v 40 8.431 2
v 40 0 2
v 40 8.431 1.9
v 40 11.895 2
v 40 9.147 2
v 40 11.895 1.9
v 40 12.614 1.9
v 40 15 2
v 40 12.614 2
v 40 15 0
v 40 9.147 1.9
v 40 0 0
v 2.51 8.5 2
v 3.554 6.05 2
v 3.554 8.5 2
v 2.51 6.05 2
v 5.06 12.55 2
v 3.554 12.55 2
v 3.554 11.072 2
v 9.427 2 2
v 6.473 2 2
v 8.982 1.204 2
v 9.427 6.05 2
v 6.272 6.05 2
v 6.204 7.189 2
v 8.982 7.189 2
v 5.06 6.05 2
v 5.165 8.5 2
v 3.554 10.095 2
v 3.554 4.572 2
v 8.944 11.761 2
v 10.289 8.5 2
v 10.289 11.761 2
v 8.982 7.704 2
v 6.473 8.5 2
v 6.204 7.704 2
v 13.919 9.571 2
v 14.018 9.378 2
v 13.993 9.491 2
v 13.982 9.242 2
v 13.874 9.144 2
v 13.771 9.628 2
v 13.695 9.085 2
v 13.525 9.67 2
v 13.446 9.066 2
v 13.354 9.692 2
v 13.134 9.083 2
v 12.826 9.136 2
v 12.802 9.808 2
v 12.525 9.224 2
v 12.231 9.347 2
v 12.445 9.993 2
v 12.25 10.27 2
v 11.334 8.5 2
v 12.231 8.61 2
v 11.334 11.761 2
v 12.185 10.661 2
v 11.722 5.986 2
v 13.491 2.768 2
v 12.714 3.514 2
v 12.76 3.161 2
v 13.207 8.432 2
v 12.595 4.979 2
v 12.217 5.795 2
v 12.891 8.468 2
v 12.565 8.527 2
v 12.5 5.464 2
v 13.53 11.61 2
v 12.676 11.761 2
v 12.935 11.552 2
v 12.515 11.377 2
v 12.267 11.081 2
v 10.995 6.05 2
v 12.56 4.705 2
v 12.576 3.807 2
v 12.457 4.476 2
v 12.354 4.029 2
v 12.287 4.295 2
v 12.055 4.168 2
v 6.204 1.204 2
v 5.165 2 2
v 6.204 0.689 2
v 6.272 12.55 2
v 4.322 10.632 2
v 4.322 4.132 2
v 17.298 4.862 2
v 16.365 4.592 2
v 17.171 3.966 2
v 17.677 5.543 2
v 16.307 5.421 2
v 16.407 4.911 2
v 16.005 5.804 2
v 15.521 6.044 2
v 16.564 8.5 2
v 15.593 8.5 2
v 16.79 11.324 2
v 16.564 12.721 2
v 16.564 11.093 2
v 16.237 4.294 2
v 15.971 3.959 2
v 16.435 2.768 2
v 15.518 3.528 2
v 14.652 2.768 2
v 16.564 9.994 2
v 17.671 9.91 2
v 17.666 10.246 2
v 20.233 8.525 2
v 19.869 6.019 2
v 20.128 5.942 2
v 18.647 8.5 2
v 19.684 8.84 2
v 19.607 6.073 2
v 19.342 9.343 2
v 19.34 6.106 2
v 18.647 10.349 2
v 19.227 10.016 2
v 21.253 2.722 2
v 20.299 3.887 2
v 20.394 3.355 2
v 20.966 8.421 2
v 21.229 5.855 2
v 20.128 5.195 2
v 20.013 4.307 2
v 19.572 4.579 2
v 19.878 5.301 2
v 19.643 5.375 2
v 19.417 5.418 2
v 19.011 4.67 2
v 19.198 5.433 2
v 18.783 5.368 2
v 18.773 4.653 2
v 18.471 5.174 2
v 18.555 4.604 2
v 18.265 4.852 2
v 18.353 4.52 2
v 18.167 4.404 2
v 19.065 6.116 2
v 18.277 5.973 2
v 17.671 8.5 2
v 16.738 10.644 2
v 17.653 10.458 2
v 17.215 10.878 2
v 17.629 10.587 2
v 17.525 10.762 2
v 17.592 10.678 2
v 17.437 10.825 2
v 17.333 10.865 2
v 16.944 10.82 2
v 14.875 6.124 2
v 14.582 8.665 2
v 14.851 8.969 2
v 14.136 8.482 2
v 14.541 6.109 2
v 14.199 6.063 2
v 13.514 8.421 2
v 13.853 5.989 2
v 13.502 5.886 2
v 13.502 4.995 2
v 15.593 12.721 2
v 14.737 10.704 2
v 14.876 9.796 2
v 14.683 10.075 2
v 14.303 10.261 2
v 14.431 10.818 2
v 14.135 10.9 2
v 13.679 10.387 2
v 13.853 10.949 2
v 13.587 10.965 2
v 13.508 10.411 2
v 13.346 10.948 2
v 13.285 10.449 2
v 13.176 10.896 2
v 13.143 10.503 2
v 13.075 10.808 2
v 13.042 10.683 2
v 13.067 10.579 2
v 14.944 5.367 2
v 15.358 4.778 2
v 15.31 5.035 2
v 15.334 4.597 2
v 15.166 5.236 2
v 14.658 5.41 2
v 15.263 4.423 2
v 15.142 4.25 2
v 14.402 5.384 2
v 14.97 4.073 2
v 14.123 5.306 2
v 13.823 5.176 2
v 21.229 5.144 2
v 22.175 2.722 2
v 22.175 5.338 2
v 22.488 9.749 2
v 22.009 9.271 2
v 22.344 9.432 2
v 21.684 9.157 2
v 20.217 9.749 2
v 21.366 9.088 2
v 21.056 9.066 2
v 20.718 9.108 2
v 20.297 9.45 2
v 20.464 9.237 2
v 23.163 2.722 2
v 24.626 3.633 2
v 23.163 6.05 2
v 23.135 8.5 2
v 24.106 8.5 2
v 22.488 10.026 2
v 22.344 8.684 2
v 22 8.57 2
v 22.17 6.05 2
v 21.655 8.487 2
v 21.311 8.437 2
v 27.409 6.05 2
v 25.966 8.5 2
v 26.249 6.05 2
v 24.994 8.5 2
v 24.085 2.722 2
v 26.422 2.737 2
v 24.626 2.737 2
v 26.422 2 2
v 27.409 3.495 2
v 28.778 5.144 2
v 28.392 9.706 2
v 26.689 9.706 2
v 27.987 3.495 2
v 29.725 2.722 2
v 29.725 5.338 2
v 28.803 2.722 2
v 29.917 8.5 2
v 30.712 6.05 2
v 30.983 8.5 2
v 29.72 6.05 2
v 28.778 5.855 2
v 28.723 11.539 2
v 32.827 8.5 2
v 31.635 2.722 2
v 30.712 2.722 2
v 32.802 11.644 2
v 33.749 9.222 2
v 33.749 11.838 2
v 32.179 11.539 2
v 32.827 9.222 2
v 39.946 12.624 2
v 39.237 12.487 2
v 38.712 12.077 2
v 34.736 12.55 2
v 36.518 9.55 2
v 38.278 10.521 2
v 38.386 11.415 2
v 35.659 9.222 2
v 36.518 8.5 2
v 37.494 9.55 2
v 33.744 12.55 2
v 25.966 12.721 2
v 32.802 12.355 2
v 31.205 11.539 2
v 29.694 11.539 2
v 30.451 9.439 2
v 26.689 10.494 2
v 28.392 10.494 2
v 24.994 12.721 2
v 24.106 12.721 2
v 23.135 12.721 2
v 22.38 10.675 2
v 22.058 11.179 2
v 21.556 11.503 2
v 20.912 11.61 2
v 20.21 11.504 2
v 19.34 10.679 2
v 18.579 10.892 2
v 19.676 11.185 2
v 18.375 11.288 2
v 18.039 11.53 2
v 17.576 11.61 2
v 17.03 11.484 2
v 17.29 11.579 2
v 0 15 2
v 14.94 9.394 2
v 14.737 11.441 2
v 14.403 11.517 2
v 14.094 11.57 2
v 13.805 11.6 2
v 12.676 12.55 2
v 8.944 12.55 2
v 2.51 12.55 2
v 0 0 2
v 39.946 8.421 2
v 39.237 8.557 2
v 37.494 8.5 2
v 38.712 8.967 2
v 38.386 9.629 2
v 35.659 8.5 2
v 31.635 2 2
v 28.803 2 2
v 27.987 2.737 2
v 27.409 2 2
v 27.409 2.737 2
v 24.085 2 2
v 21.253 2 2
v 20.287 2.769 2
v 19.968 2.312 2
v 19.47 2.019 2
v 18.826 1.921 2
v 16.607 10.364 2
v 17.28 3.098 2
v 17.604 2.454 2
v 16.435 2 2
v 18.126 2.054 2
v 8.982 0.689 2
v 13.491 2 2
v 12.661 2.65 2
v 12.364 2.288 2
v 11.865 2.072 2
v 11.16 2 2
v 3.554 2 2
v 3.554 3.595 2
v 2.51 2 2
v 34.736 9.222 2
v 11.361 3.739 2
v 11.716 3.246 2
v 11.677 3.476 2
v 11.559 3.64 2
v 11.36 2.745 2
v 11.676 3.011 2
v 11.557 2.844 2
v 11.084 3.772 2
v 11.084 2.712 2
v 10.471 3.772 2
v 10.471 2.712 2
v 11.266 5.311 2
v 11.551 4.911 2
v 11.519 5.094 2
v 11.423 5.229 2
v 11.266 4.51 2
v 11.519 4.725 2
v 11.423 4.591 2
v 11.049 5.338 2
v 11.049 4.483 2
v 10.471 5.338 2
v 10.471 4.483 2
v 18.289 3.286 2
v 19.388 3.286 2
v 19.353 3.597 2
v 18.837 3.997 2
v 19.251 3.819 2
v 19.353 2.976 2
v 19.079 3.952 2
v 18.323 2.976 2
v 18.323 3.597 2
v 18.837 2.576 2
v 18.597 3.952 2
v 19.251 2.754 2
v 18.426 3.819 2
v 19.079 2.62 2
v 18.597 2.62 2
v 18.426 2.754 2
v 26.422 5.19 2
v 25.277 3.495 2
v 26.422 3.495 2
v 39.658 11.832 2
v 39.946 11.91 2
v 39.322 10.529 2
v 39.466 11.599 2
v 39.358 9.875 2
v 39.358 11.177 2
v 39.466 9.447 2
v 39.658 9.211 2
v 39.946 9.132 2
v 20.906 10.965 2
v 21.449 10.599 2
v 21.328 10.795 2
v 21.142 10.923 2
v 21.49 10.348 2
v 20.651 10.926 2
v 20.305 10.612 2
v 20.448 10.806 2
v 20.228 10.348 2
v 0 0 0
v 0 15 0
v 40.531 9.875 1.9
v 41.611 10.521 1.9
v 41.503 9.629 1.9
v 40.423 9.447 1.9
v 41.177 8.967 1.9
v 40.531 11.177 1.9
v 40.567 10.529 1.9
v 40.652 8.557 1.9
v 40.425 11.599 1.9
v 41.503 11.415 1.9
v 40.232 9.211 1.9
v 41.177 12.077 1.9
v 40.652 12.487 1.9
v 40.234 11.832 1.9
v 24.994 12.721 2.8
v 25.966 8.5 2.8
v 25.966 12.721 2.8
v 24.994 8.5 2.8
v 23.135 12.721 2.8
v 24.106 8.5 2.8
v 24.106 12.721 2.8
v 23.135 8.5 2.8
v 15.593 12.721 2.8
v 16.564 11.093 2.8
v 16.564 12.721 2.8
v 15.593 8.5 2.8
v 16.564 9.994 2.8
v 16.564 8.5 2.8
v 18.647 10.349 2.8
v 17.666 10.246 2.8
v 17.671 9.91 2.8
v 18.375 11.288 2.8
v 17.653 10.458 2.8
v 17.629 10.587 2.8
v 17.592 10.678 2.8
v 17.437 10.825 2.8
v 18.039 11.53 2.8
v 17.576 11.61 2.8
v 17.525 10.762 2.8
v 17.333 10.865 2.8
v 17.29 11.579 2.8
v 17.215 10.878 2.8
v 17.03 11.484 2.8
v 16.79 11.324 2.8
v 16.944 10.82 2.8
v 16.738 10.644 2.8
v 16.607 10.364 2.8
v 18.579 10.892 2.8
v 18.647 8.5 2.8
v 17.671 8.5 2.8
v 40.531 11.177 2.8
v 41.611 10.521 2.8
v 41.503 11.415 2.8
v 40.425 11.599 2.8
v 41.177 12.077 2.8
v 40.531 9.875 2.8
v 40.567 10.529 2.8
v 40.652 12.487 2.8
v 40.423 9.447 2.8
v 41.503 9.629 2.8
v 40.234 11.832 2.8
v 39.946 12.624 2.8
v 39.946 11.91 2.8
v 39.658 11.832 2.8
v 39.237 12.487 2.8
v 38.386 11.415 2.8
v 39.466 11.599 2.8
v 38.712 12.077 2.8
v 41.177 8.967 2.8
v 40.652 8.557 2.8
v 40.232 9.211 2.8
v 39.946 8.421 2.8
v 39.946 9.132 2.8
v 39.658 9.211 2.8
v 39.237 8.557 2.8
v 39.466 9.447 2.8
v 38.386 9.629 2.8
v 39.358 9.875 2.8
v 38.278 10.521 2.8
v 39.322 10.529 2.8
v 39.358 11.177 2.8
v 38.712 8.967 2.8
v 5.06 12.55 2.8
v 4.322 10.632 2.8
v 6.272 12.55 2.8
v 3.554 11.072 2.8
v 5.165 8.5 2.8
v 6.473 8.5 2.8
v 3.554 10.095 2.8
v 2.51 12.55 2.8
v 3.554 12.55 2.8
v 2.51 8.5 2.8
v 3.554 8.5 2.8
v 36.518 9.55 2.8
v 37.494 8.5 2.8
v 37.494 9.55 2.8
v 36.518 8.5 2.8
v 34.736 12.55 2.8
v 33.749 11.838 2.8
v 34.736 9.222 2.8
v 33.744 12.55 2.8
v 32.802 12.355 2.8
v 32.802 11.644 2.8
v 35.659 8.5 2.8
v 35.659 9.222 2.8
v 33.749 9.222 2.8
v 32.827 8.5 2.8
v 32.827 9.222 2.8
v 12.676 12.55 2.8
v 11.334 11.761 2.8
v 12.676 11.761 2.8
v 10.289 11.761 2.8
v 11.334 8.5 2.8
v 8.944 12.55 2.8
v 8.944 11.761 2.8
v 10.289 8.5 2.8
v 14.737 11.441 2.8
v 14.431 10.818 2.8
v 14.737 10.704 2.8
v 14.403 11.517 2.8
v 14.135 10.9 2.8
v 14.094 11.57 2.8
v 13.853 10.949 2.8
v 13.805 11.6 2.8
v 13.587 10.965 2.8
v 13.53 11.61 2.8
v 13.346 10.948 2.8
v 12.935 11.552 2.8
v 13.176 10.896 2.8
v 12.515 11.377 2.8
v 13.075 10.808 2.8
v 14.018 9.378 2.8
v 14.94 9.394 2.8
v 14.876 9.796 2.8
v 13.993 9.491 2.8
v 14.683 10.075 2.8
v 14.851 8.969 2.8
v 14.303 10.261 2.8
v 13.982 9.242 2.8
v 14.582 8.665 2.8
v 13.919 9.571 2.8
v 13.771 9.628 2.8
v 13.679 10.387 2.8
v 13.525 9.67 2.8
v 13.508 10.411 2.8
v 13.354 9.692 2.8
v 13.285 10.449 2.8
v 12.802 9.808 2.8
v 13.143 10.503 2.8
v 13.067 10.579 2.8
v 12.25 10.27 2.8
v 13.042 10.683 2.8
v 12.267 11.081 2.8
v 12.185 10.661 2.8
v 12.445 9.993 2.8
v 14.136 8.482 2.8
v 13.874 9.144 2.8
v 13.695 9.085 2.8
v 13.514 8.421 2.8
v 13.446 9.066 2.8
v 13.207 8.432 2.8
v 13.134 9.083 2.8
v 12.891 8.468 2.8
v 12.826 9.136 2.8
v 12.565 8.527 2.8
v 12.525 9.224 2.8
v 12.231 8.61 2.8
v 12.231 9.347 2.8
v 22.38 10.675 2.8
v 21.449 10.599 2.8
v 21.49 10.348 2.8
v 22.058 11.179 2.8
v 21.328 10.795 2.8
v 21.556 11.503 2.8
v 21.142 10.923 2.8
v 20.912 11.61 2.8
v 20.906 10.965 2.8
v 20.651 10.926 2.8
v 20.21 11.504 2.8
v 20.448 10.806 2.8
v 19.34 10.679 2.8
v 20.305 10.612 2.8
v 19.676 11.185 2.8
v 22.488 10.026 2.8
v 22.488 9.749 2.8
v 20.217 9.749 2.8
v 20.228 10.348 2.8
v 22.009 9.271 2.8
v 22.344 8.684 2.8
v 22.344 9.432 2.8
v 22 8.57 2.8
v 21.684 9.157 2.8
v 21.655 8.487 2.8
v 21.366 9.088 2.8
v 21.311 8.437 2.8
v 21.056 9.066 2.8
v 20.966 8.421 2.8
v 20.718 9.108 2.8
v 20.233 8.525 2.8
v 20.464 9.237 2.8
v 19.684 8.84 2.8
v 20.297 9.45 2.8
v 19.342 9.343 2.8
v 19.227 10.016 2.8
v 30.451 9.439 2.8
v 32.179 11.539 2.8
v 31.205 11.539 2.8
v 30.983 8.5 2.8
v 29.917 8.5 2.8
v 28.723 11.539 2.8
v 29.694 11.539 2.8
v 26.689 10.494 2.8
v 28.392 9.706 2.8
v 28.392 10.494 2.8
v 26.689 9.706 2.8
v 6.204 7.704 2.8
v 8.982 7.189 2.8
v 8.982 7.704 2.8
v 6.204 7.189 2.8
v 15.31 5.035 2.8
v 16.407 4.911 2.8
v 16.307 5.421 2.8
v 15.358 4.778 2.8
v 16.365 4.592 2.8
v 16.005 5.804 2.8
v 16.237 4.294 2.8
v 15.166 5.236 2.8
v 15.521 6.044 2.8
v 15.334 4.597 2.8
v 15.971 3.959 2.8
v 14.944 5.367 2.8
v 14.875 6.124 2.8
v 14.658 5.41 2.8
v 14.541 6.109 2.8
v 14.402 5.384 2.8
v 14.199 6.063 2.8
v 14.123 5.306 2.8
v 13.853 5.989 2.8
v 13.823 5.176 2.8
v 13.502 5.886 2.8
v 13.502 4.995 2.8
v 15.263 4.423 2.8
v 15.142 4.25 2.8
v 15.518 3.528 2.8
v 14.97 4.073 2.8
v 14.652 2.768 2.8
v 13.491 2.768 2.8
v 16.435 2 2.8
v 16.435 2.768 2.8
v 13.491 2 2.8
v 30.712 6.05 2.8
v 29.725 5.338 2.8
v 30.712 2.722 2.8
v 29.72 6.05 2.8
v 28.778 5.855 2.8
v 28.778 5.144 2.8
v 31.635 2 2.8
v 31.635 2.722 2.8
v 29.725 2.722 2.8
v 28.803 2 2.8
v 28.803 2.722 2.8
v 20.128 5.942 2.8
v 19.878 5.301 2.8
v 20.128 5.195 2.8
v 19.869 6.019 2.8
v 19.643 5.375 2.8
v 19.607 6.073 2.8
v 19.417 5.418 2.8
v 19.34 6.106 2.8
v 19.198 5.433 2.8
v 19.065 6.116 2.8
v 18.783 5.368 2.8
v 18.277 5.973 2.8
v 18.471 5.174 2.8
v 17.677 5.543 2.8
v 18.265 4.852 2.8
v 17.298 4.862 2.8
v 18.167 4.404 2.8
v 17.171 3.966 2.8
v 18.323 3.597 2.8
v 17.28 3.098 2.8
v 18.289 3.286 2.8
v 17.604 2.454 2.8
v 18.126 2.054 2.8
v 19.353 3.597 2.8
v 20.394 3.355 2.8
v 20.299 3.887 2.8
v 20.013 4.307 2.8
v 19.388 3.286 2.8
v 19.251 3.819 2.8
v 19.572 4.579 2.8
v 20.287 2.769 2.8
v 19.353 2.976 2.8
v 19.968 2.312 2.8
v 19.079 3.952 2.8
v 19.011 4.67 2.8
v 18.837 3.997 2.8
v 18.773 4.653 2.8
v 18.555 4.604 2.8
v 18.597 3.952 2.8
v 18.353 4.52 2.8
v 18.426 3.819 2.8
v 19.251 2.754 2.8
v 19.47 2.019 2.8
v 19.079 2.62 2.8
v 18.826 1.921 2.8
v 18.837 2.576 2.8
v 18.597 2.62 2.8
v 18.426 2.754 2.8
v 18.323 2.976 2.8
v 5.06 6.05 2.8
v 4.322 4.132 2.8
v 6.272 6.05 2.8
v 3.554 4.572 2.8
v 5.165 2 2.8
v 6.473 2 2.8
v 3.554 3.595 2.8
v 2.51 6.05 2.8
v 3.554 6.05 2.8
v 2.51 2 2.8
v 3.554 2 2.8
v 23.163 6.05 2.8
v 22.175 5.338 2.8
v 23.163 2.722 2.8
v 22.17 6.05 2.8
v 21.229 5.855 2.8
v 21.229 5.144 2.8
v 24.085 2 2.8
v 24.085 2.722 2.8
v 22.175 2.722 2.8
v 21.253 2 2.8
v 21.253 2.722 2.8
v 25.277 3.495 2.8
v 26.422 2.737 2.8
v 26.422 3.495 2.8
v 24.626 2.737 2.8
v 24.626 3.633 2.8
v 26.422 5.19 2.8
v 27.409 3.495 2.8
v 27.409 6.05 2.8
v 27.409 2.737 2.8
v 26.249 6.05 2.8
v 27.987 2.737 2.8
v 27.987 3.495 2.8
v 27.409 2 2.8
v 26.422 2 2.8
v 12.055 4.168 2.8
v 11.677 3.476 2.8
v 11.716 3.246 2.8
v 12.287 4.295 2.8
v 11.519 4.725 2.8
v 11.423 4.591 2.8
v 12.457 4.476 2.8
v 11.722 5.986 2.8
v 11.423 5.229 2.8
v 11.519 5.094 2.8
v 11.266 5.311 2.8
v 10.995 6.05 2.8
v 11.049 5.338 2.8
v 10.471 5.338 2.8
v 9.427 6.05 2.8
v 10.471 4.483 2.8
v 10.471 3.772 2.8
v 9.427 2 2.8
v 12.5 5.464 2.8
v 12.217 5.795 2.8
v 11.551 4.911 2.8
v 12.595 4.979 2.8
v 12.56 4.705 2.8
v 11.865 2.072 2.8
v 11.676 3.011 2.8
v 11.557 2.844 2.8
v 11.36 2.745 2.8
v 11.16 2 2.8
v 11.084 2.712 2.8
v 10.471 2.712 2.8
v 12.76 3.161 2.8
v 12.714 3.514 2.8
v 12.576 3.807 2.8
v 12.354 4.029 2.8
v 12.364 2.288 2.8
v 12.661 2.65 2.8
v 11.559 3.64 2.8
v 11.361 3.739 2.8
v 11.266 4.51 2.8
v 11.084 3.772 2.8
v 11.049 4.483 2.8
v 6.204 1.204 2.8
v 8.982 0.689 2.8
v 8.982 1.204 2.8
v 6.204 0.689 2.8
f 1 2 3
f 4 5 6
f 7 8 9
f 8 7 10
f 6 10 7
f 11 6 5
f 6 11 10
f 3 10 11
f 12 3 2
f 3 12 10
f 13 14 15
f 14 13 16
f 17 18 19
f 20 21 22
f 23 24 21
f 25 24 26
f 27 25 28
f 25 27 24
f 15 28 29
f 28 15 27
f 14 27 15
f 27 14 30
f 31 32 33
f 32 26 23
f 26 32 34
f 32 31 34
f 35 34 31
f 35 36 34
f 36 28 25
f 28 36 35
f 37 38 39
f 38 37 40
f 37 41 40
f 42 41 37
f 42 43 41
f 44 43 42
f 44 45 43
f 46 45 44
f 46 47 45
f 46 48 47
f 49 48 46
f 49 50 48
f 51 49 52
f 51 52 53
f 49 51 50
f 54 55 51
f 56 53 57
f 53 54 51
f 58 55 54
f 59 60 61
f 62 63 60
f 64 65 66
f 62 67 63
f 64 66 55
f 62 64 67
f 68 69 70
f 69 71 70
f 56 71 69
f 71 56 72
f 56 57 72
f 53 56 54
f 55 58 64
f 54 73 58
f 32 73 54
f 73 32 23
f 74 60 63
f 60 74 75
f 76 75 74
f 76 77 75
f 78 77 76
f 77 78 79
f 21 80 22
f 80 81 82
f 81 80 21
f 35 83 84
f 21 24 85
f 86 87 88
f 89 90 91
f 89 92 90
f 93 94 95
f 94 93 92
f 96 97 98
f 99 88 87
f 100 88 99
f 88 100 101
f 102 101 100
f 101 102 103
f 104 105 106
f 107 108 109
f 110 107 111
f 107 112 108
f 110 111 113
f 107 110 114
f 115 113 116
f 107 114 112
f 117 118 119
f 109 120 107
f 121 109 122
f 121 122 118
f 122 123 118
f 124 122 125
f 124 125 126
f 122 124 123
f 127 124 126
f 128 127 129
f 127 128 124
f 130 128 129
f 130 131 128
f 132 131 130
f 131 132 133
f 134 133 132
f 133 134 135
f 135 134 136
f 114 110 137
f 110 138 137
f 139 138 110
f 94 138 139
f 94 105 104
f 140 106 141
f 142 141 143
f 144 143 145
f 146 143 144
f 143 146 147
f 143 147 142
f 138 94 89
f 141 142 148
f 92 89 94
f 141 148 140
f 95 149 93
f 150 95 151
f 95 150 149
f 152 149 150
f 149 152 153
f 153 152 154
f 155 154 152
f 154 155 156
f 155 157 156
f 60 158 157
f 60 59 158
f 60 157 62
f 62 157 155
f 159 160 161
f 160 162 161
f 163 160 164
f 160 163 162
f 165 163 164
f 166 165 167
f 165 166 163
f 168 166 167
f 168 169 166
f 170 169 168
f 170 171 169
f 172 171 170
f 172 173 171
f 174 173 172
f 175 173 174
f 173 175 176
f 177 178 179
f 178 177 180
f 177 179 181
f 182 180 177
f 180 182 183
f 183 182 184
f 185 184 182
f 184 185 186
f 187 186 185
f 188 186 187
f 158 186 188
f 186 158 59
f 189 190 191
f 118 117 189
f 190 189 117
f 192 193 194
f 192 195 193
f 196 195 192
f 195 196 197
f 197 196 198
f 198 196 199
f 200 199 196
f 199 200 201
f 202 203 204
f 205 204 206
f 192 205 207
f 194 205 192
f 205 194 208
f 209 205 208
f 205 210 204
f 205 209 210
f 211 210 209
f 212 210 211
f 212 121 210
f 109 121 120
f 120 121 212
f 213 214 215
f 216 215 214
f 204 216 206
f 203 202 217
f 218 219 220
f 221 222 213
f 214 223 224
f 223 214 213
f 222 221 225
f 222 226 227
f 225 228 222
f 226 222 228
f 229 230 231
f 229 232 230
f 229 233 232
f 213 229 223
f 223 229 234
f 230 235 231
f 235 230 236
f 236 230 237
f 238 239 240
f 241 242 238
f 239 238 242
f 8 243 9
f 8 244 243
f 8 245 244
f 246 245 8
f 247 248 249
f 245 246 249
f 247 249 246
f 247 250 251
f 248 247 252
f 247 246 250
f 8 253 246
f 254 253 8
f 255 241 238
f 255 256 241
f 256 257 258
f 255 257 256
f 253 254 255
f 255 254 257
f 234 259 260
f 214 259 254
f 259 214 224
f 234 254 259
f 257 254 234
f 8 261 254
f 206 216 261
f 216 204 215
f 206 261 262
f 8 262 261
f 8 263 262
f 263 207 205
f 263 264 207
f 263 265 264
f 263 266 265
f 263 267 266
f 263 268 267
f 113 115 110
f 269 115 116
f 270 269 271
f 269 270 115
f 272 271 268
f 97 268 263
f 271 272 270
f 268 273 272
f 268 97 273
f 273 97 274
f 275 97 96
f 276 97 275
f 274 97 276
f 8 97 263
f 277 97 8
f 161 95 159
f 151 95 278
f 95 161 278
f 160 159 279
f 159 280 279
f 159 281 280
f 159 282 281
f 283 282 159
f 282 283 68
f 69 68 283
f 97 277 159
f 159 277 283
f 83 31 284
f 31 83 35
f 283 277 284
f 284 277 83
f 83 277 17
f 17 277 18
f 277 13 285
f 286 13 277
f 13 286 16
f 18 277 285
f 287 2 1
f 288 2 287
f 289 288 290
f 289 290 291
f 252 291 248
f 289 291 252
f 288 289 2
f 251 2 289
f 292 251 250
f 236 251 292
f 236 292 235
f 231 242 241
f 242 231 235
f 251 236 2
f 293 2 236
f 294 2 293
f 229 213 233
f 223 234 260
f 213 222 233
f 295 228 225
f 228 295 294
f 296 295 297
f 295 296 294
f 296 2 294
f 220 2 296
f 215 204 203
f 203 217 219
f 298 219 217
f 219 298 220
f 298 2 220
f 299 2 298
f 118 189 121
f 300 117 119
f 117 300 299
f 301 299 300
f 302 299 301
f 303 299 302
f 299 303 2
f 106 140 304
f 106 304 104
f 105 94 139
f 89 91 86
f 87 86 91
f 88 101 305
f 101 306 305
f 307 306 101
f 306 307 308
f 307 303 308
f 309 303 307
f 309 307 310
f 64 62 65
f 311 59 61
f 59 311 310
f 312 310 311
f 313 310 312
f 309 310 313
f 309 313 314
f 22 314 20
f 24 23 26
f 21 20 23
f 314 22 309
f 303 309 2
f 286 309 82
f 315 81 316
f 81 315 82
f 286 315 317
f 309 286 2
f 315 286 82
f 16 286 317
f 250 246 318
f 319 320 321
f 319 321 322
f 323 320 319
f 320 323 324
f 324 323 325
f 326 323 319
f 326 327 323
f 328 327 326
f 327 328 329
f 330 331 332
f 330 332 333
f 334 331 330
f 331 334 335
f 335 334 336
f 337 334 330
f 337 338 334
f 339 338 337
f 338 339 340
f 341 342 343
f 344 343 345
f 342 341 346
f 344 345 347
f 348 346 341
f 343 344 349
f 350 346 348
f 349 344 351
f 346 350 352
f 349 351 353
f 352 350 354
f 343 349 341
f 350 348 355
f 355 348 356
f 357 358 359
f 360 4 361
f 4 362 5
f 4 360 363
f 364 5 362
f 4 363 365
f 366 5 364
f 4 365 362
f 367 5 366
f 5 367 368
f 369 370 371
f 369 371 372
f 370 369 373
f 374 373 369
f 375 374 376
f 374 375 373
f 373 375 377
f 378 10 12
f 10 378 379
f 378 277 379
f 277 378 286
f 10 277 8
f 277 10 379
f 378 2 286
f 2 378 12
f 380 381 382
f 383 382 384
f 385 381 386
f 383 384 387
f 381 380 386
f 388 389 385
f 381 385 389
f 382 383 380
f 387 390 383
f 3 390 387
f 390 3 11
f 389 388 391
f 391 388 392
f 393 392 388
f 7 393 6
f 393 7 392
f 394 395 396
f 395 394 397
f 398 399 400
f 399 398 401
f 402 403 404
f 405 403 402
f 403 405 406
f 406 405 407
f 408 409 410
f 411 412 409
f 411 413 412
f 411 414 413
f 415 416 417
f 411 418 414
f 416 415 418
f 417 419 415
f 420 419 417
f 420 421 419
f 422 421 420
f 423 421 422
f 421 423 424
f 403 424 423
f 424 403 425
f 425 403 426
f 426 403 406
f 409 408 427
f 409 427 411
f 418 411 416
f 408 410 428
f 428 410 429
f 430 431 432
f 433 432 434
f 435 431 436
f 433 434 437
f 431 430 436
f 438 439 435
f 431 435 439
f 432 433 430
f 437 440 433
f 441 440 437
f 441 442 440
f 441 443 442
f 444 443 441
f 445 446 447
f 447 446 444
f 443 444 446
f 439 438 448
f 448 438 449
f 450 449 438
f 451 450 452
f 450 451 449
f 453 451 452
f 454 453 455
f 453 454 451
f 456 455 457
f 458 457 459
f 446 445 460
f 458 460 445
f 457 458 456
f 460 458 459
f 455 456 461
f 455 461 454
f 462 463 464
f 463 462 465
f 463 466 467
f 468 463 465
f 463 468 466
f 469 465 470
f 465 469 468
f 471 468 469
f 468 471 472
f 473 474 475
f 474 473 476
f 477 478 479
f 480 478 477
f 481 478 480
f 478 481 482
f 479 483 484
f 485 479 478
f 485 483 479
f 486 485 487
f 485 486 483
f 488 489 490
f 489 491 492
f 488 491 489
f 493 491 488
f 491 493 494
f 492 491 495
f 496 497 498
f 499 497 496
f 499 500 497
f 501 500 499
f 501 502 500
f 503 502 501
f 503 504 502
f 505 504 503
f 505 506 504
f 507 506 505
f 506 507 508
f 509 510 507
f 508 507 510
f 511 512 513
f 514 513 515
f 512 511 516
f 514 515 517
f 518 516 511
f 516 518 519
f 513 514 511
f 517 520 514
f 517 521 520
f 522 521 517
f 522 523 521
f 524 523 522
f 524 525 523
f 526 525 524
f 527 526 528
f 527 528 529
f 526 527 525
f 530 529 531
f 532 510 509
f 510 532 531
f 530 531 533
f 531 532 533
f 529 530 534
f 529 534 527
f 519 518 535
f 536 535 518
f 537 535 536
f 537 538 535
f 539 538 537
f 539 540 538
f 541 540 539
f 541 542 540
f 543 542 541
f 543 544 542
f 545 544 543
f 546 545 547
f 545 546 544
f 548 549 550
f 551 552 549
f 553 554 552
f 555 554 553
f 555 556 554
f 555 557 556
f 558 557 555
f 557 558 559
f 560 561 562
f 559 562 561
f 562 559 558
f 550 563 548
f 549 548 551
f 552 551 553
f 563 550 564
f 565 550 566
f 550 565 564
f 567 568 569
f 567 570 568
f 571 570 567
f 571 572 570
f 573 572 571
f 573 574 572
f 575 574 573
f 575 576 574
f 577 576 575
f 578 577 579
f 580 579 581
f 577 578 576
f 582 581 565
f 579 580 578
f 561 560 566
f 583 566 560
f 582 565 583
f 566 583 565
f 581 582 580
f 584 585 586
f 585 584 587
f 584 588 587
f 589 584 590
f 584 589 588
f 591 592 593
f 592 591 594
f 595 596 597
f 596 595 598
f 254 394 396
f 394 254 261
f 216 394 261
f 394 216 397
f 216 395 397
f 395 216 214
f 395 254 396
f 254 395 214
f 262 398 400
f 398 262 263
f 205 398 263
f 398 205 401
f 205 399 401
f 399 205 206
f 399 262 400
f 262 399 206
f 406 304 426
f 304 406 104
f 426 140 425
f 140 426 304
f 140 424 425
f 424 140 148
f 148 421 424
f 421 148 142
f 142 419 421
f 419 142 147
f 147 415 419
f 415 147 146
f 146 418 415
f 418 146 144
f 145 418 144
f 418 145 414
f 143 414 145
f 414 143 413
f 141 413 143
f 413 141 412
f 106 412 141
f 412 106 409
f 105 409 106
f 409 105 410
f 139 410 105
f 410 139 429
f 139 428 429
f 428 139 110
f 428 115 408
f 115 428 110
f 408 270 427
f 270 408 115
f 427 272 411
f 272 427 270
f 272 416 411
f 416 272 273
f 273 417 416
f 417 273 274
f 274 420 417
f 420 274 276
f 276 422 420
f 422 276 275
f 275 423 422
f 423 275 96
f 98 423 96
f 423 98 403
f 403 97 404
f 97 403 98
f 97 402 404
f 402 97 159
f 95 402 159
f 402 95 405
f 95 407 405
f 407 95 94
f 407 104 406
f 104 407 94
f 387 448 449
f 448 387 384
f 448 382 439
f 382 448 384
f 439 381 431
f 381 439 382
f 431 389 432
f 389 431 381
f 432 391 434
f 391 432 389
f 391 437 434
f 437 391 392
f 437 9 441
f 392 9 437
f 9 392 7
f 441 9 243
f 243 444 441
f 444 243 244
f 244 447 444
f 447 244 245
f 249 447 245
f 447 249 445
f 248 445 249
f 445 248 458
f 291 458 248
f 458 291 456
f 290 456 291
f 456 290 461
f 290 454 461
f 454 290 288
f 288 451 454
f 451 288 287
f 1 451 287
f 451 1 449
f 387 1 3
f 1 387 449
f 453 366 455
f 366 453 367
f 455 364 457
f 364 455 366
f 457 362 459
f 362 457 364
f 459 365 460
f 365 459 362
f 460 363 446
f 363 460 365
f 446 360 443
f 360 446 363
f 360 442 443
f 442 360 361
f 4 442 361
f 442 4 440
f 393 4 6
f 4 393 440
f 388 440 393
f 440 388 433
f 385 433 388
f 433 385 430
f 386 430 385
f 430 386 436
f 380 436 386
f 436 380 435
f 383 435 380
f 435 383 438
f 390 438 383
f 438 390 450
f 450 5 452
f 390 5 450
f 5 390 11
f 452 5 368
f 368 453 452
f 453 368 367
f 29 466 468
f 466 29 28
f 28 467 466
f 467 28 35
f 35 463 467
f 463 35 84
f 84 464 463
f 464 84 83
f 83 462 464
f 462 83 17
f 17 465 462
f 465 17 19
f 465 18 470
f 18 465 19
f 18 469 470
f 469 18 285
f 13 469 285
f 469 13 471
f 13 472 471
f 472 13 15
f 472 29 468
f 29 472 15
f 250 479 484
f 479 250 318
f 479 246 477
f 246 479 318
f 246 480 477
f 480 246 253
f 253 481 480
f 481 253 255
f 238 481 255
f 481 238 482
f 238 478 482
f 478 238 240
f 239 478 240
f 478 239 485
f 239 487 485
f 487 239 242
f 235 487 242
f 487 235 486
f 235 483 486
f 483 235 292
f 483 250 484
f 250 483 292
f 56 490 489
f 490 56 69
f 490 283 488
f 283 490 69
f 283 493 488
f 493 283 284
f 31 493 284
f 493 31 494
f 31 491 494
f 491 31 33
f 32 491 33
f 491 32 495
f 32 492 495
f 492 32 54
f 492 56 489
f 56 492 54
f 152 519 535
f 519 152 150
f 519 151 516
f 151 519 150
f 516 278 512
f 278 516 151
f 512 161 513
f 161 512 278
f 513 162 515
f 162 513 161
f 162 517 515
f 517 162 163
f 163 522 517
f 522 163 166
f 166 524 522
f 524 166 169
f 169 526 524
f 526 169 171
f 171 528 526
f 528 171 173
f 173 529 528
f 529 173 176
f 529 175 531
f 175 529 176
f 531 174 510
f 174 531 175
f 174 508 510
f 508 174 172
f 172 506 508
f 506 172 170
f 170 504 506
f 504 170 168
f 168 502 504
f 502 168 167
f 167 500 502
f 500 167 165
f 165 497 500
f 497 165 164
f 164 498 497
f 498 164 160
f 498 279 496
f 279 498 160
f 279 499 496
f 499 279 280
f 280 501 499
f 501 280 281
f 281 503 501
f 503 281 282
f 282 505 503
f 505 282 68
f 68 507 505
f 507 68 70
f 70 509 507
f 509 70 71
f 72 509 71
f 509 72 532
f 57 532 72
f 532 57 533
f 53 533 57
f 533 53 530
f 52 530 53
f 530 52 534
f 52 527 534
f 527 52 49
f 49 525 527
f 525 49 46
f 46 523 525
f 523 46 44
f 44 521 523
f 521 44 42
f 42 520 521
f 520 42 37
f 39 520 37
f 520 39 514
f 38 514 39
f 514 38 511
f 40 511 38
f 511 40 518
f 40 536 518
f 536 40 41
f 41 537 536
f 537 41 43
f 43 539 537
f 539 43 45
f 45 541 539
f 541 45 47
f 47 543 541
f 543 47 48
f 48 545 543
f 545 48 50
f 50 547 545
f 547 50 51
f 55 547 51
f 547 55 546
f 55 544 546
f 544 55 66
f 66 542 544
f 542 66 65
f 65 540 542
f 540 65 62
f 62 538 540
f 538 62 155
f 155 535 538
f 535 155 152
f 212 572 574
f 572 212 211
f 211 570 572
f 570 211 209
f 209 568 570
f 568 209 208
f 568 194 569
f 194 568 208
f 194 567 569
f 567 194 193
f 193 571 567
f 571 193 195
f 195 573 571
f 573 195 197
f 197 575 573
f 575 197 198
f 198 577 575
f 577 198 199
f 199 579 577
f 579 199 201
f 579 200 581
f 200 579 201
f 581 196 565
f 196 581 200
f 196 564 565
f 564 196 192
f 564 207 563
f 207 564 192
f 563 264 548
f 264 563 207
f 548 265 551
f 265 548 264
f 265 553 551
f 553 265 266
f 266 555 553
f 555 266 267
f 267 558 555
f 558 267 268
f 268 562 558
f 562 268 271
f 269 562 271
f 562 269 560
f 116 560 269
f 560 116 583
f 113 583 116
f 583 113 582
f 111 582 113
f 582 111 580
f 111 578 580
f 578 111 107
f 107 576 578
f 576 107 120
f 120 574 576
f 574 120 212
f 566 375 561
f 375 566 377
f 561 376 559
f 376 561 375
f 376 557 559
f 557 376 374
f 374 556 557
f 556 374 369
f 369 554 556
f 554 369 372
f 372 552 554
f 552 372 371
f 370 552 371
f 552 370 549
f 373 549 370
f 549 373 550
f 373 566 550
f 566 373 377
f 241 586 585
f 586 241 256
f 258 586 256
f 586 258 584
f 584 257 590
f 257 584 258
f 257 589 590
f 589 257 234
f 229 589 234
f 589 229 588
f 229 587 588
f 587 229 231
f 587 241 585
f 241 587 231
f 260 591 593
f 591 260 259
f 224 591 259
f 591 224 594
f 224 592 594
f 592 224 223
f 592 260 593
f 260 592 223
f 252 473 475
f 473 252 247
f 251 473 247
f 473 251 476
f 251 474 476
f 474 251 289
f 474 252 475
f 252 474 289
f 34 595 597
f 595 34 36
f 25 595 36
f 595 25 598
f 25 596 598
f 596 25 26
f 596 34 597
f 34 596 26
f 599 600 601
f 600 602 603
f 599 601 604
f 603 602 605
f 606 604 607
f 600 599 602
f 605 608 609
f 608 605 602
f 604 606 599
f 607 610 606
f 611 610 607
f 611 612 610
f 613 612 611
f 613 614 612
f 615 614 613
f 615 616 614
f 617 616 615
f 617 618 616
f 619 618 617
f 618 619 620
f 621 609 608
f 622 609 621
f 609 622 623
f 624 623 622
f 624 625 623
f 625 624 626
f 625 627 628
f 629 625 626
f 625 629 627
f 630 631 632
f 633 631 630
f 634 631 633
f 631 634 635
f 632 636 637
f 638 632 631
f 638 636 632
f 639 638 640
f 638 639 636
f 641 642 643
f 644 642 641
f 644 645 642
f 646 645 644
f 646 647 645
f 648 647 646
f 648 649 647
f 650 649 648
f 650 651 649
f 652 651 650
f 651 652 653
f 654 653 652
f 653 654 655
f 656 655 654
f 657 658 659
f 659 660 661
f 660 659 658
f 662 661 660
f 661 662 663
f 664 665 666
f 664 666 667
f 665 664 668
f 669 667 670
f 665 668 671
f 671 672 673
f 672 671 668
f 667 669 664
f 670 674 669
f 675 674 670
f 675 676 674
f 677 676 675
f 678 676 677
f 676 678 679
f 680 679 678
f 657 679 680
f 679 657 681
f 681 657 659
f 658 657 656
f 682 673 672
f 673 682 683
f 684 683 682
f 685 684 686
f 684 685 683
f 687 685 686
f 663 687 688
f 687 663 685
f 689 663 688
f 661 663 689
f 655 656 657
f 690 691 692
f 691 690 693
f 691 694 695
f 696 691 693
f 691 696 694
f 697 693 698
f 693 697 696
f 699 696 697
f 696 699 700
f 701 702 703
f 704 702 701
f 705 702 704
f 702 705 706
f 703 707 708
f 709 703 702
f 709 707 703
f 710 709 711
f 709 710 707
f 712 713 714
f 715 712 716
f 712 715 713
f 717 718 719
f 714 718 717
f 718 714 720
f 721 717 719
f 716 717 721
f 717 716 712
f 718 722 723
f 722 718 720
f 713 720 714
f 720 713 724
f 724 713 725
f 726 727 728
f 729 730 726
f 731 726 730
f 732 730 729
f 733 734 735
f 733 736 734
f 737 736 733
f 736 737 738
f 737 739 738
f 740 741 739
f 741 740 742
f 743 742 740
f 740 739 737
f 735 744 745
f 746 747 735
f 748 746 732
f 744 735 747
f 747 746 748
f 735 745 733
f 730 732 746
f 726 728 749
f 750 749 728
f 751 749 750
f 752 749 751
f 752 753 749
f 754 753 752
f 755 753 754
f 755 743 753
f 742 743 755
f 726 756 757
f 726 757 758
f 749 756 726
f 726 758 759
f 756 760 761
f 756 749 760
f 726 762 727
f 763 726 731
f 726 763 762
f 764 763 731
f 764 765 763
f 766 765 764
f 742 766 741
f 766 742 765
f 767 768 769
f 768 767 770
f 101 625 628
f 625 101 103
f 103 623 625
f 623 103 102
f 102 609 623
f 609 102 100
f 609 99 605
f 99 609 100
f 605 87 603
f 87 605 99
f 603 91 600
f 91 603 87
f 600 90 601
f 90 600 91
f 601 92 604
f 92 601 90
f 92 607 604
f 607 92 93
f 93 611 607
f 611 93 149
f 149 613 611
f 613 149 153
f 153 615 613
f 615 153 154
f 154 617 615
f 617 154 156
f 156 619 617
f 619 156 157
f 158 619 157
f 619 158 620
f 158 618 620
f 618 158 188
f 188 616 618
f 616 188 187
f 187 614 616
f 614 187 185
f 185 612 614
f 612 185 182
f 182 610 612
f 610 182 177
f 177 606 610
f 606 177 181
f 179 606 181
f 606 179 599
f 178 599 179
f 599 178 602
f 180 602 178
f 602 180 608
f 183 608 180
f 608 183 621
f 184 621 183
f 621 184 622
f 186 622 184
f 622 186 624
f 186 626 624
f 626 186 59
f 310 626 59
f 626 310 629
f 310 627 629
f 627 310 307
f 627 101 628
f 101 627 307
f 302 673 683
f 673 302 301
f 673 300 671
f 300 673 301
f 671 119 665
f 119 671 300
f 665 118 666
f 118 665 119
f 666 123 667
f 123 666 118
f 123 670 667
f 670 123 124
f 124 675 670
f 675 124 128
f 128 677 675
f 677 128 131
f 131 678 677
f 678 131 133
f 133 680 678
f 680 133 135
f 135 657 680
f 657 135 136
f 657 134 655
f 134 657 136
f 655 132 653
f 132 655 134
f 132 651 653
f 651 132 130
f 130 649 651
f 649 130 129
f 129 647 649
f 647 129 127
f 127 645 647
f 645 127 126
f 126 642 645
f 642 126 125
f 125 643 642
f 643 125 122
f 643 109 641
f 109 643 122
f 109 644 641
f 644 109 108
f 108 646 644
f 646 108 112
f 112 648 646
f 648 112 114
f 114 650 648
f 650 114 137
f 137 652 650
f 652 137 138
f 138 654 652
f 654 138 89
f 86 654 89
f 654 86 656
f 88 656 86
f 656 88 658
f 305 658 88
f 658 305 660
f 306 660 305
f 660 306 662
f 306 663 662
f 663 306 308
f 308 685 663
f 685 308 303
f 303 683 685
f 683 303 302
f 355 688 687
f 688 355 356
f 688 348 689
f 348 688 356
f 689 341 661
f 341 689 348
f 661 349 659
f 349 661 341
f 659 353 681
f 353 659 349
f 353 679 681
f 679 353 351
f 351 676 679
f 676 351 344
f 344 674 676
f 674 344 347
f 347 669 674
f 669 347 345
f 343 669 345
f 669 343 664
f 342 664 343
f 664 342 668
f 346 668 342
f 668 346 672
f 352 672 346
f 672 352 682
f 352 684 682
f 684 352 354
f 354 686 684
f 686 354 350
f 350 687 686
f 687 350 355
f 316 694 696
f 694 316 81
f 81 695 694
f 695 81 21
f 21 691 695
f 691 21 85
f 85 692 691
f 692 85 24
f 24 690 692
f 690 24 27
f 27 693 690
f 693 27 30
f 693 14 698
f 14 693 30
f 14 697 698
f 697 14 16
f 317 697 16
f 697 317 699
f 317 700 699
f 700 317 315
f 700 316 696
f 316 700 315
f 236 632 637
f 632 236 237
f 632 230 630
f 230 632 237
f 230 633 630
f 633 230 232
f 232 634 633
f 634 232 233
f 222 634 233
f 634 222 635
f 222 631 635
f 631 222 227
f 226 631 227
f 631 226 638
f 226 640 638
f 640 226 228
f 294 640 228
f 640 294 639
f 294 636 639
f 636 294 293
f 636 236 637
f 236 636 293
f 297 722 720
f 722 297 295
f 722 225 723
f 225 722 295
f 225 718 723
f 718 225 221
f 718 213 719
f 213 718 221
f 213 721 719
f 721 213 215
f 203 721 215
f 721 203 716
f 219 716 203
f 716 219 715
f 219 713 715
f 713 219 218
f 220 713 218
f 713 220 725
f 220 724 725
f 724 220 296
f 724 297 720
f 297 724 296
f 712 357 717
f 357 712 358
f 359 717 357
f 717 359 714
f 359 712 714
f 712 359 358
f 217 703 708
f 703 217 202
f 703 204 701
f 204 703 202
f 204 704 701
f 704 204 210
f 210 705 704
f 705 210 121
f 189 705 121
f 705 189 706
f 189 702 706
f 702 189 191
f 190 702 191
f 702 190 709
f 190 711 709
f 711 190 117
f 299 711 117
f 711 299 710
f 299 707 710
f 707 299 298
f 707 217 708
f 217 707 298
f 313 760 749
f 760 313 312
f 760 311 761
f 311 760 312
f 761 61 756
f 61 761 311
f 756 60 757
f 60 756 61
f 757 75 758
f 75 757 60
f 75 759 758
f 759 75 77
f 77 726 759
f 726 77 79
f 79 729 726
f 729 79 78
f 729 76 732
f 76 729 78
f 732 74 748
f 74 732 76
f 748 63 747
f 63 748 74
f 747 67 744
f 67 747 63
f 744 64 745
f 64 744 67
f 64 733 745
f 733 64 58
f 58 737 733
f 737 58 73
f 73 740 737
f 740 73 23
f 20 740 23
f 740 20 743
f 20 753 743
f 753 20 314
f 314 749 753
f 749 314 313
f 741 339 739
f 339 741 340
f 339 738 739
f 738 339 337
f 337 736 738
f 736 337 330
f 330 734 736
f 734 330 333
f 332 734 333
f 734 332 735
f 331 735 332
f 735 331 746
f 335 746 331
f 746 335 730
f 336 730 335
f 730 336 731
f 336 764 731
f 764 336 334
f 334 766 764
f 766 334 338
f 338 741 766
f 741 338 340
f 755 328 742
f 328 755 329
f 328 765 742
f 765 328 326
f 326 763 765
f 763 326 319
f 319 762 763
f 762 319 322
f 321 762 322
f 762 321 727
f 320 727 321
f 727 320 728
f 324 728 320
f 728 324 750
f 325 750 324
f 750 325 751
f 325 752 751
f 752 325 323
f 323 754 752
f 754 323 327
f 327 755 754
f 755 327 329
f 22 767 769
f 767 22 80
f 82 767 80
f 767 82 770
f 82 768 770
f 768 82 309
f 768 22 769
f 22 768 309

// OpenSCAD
module test_part()
{cube([40,15,2]);
    
    }
    
    
    
    
year= 26;
week = 14;
day = 1;
PartName = "Tshell";
partVersion = "v1.0";


partNunmber = str(PartName, "-",partVersion);

batch =str("B", formate_number(year),formate_number(week),day);





// debossed
    /*
difference(){
test_part();
translate([2,8.5,2-0.6])numbering(0.6+0.01,4,PartNumber =partNunmber );
    translate([2,2,2-0.6])numbering(0.6+0.01,4,PartNumber =batch);
}*/
// embossed

test_part();
translate([2,8.5,2-0.1])numbering(0.8+0.1,4,PartNumber =partNunmber );
    translate([2,2,2-0.1])numbering(0.8+0.1,4,PartNumber =batch);
    



module numbering(t, s, PartNumber)
    {
        linear_extrude(t)
text(str("K_",PartNumber),size = s,font = "Arial Rounded MT Bold:style=Bold");  
        
        }

    
function formate_number(num) = 
    (
        
        (num < 10)?str("0",num): str(num)
        
         );
